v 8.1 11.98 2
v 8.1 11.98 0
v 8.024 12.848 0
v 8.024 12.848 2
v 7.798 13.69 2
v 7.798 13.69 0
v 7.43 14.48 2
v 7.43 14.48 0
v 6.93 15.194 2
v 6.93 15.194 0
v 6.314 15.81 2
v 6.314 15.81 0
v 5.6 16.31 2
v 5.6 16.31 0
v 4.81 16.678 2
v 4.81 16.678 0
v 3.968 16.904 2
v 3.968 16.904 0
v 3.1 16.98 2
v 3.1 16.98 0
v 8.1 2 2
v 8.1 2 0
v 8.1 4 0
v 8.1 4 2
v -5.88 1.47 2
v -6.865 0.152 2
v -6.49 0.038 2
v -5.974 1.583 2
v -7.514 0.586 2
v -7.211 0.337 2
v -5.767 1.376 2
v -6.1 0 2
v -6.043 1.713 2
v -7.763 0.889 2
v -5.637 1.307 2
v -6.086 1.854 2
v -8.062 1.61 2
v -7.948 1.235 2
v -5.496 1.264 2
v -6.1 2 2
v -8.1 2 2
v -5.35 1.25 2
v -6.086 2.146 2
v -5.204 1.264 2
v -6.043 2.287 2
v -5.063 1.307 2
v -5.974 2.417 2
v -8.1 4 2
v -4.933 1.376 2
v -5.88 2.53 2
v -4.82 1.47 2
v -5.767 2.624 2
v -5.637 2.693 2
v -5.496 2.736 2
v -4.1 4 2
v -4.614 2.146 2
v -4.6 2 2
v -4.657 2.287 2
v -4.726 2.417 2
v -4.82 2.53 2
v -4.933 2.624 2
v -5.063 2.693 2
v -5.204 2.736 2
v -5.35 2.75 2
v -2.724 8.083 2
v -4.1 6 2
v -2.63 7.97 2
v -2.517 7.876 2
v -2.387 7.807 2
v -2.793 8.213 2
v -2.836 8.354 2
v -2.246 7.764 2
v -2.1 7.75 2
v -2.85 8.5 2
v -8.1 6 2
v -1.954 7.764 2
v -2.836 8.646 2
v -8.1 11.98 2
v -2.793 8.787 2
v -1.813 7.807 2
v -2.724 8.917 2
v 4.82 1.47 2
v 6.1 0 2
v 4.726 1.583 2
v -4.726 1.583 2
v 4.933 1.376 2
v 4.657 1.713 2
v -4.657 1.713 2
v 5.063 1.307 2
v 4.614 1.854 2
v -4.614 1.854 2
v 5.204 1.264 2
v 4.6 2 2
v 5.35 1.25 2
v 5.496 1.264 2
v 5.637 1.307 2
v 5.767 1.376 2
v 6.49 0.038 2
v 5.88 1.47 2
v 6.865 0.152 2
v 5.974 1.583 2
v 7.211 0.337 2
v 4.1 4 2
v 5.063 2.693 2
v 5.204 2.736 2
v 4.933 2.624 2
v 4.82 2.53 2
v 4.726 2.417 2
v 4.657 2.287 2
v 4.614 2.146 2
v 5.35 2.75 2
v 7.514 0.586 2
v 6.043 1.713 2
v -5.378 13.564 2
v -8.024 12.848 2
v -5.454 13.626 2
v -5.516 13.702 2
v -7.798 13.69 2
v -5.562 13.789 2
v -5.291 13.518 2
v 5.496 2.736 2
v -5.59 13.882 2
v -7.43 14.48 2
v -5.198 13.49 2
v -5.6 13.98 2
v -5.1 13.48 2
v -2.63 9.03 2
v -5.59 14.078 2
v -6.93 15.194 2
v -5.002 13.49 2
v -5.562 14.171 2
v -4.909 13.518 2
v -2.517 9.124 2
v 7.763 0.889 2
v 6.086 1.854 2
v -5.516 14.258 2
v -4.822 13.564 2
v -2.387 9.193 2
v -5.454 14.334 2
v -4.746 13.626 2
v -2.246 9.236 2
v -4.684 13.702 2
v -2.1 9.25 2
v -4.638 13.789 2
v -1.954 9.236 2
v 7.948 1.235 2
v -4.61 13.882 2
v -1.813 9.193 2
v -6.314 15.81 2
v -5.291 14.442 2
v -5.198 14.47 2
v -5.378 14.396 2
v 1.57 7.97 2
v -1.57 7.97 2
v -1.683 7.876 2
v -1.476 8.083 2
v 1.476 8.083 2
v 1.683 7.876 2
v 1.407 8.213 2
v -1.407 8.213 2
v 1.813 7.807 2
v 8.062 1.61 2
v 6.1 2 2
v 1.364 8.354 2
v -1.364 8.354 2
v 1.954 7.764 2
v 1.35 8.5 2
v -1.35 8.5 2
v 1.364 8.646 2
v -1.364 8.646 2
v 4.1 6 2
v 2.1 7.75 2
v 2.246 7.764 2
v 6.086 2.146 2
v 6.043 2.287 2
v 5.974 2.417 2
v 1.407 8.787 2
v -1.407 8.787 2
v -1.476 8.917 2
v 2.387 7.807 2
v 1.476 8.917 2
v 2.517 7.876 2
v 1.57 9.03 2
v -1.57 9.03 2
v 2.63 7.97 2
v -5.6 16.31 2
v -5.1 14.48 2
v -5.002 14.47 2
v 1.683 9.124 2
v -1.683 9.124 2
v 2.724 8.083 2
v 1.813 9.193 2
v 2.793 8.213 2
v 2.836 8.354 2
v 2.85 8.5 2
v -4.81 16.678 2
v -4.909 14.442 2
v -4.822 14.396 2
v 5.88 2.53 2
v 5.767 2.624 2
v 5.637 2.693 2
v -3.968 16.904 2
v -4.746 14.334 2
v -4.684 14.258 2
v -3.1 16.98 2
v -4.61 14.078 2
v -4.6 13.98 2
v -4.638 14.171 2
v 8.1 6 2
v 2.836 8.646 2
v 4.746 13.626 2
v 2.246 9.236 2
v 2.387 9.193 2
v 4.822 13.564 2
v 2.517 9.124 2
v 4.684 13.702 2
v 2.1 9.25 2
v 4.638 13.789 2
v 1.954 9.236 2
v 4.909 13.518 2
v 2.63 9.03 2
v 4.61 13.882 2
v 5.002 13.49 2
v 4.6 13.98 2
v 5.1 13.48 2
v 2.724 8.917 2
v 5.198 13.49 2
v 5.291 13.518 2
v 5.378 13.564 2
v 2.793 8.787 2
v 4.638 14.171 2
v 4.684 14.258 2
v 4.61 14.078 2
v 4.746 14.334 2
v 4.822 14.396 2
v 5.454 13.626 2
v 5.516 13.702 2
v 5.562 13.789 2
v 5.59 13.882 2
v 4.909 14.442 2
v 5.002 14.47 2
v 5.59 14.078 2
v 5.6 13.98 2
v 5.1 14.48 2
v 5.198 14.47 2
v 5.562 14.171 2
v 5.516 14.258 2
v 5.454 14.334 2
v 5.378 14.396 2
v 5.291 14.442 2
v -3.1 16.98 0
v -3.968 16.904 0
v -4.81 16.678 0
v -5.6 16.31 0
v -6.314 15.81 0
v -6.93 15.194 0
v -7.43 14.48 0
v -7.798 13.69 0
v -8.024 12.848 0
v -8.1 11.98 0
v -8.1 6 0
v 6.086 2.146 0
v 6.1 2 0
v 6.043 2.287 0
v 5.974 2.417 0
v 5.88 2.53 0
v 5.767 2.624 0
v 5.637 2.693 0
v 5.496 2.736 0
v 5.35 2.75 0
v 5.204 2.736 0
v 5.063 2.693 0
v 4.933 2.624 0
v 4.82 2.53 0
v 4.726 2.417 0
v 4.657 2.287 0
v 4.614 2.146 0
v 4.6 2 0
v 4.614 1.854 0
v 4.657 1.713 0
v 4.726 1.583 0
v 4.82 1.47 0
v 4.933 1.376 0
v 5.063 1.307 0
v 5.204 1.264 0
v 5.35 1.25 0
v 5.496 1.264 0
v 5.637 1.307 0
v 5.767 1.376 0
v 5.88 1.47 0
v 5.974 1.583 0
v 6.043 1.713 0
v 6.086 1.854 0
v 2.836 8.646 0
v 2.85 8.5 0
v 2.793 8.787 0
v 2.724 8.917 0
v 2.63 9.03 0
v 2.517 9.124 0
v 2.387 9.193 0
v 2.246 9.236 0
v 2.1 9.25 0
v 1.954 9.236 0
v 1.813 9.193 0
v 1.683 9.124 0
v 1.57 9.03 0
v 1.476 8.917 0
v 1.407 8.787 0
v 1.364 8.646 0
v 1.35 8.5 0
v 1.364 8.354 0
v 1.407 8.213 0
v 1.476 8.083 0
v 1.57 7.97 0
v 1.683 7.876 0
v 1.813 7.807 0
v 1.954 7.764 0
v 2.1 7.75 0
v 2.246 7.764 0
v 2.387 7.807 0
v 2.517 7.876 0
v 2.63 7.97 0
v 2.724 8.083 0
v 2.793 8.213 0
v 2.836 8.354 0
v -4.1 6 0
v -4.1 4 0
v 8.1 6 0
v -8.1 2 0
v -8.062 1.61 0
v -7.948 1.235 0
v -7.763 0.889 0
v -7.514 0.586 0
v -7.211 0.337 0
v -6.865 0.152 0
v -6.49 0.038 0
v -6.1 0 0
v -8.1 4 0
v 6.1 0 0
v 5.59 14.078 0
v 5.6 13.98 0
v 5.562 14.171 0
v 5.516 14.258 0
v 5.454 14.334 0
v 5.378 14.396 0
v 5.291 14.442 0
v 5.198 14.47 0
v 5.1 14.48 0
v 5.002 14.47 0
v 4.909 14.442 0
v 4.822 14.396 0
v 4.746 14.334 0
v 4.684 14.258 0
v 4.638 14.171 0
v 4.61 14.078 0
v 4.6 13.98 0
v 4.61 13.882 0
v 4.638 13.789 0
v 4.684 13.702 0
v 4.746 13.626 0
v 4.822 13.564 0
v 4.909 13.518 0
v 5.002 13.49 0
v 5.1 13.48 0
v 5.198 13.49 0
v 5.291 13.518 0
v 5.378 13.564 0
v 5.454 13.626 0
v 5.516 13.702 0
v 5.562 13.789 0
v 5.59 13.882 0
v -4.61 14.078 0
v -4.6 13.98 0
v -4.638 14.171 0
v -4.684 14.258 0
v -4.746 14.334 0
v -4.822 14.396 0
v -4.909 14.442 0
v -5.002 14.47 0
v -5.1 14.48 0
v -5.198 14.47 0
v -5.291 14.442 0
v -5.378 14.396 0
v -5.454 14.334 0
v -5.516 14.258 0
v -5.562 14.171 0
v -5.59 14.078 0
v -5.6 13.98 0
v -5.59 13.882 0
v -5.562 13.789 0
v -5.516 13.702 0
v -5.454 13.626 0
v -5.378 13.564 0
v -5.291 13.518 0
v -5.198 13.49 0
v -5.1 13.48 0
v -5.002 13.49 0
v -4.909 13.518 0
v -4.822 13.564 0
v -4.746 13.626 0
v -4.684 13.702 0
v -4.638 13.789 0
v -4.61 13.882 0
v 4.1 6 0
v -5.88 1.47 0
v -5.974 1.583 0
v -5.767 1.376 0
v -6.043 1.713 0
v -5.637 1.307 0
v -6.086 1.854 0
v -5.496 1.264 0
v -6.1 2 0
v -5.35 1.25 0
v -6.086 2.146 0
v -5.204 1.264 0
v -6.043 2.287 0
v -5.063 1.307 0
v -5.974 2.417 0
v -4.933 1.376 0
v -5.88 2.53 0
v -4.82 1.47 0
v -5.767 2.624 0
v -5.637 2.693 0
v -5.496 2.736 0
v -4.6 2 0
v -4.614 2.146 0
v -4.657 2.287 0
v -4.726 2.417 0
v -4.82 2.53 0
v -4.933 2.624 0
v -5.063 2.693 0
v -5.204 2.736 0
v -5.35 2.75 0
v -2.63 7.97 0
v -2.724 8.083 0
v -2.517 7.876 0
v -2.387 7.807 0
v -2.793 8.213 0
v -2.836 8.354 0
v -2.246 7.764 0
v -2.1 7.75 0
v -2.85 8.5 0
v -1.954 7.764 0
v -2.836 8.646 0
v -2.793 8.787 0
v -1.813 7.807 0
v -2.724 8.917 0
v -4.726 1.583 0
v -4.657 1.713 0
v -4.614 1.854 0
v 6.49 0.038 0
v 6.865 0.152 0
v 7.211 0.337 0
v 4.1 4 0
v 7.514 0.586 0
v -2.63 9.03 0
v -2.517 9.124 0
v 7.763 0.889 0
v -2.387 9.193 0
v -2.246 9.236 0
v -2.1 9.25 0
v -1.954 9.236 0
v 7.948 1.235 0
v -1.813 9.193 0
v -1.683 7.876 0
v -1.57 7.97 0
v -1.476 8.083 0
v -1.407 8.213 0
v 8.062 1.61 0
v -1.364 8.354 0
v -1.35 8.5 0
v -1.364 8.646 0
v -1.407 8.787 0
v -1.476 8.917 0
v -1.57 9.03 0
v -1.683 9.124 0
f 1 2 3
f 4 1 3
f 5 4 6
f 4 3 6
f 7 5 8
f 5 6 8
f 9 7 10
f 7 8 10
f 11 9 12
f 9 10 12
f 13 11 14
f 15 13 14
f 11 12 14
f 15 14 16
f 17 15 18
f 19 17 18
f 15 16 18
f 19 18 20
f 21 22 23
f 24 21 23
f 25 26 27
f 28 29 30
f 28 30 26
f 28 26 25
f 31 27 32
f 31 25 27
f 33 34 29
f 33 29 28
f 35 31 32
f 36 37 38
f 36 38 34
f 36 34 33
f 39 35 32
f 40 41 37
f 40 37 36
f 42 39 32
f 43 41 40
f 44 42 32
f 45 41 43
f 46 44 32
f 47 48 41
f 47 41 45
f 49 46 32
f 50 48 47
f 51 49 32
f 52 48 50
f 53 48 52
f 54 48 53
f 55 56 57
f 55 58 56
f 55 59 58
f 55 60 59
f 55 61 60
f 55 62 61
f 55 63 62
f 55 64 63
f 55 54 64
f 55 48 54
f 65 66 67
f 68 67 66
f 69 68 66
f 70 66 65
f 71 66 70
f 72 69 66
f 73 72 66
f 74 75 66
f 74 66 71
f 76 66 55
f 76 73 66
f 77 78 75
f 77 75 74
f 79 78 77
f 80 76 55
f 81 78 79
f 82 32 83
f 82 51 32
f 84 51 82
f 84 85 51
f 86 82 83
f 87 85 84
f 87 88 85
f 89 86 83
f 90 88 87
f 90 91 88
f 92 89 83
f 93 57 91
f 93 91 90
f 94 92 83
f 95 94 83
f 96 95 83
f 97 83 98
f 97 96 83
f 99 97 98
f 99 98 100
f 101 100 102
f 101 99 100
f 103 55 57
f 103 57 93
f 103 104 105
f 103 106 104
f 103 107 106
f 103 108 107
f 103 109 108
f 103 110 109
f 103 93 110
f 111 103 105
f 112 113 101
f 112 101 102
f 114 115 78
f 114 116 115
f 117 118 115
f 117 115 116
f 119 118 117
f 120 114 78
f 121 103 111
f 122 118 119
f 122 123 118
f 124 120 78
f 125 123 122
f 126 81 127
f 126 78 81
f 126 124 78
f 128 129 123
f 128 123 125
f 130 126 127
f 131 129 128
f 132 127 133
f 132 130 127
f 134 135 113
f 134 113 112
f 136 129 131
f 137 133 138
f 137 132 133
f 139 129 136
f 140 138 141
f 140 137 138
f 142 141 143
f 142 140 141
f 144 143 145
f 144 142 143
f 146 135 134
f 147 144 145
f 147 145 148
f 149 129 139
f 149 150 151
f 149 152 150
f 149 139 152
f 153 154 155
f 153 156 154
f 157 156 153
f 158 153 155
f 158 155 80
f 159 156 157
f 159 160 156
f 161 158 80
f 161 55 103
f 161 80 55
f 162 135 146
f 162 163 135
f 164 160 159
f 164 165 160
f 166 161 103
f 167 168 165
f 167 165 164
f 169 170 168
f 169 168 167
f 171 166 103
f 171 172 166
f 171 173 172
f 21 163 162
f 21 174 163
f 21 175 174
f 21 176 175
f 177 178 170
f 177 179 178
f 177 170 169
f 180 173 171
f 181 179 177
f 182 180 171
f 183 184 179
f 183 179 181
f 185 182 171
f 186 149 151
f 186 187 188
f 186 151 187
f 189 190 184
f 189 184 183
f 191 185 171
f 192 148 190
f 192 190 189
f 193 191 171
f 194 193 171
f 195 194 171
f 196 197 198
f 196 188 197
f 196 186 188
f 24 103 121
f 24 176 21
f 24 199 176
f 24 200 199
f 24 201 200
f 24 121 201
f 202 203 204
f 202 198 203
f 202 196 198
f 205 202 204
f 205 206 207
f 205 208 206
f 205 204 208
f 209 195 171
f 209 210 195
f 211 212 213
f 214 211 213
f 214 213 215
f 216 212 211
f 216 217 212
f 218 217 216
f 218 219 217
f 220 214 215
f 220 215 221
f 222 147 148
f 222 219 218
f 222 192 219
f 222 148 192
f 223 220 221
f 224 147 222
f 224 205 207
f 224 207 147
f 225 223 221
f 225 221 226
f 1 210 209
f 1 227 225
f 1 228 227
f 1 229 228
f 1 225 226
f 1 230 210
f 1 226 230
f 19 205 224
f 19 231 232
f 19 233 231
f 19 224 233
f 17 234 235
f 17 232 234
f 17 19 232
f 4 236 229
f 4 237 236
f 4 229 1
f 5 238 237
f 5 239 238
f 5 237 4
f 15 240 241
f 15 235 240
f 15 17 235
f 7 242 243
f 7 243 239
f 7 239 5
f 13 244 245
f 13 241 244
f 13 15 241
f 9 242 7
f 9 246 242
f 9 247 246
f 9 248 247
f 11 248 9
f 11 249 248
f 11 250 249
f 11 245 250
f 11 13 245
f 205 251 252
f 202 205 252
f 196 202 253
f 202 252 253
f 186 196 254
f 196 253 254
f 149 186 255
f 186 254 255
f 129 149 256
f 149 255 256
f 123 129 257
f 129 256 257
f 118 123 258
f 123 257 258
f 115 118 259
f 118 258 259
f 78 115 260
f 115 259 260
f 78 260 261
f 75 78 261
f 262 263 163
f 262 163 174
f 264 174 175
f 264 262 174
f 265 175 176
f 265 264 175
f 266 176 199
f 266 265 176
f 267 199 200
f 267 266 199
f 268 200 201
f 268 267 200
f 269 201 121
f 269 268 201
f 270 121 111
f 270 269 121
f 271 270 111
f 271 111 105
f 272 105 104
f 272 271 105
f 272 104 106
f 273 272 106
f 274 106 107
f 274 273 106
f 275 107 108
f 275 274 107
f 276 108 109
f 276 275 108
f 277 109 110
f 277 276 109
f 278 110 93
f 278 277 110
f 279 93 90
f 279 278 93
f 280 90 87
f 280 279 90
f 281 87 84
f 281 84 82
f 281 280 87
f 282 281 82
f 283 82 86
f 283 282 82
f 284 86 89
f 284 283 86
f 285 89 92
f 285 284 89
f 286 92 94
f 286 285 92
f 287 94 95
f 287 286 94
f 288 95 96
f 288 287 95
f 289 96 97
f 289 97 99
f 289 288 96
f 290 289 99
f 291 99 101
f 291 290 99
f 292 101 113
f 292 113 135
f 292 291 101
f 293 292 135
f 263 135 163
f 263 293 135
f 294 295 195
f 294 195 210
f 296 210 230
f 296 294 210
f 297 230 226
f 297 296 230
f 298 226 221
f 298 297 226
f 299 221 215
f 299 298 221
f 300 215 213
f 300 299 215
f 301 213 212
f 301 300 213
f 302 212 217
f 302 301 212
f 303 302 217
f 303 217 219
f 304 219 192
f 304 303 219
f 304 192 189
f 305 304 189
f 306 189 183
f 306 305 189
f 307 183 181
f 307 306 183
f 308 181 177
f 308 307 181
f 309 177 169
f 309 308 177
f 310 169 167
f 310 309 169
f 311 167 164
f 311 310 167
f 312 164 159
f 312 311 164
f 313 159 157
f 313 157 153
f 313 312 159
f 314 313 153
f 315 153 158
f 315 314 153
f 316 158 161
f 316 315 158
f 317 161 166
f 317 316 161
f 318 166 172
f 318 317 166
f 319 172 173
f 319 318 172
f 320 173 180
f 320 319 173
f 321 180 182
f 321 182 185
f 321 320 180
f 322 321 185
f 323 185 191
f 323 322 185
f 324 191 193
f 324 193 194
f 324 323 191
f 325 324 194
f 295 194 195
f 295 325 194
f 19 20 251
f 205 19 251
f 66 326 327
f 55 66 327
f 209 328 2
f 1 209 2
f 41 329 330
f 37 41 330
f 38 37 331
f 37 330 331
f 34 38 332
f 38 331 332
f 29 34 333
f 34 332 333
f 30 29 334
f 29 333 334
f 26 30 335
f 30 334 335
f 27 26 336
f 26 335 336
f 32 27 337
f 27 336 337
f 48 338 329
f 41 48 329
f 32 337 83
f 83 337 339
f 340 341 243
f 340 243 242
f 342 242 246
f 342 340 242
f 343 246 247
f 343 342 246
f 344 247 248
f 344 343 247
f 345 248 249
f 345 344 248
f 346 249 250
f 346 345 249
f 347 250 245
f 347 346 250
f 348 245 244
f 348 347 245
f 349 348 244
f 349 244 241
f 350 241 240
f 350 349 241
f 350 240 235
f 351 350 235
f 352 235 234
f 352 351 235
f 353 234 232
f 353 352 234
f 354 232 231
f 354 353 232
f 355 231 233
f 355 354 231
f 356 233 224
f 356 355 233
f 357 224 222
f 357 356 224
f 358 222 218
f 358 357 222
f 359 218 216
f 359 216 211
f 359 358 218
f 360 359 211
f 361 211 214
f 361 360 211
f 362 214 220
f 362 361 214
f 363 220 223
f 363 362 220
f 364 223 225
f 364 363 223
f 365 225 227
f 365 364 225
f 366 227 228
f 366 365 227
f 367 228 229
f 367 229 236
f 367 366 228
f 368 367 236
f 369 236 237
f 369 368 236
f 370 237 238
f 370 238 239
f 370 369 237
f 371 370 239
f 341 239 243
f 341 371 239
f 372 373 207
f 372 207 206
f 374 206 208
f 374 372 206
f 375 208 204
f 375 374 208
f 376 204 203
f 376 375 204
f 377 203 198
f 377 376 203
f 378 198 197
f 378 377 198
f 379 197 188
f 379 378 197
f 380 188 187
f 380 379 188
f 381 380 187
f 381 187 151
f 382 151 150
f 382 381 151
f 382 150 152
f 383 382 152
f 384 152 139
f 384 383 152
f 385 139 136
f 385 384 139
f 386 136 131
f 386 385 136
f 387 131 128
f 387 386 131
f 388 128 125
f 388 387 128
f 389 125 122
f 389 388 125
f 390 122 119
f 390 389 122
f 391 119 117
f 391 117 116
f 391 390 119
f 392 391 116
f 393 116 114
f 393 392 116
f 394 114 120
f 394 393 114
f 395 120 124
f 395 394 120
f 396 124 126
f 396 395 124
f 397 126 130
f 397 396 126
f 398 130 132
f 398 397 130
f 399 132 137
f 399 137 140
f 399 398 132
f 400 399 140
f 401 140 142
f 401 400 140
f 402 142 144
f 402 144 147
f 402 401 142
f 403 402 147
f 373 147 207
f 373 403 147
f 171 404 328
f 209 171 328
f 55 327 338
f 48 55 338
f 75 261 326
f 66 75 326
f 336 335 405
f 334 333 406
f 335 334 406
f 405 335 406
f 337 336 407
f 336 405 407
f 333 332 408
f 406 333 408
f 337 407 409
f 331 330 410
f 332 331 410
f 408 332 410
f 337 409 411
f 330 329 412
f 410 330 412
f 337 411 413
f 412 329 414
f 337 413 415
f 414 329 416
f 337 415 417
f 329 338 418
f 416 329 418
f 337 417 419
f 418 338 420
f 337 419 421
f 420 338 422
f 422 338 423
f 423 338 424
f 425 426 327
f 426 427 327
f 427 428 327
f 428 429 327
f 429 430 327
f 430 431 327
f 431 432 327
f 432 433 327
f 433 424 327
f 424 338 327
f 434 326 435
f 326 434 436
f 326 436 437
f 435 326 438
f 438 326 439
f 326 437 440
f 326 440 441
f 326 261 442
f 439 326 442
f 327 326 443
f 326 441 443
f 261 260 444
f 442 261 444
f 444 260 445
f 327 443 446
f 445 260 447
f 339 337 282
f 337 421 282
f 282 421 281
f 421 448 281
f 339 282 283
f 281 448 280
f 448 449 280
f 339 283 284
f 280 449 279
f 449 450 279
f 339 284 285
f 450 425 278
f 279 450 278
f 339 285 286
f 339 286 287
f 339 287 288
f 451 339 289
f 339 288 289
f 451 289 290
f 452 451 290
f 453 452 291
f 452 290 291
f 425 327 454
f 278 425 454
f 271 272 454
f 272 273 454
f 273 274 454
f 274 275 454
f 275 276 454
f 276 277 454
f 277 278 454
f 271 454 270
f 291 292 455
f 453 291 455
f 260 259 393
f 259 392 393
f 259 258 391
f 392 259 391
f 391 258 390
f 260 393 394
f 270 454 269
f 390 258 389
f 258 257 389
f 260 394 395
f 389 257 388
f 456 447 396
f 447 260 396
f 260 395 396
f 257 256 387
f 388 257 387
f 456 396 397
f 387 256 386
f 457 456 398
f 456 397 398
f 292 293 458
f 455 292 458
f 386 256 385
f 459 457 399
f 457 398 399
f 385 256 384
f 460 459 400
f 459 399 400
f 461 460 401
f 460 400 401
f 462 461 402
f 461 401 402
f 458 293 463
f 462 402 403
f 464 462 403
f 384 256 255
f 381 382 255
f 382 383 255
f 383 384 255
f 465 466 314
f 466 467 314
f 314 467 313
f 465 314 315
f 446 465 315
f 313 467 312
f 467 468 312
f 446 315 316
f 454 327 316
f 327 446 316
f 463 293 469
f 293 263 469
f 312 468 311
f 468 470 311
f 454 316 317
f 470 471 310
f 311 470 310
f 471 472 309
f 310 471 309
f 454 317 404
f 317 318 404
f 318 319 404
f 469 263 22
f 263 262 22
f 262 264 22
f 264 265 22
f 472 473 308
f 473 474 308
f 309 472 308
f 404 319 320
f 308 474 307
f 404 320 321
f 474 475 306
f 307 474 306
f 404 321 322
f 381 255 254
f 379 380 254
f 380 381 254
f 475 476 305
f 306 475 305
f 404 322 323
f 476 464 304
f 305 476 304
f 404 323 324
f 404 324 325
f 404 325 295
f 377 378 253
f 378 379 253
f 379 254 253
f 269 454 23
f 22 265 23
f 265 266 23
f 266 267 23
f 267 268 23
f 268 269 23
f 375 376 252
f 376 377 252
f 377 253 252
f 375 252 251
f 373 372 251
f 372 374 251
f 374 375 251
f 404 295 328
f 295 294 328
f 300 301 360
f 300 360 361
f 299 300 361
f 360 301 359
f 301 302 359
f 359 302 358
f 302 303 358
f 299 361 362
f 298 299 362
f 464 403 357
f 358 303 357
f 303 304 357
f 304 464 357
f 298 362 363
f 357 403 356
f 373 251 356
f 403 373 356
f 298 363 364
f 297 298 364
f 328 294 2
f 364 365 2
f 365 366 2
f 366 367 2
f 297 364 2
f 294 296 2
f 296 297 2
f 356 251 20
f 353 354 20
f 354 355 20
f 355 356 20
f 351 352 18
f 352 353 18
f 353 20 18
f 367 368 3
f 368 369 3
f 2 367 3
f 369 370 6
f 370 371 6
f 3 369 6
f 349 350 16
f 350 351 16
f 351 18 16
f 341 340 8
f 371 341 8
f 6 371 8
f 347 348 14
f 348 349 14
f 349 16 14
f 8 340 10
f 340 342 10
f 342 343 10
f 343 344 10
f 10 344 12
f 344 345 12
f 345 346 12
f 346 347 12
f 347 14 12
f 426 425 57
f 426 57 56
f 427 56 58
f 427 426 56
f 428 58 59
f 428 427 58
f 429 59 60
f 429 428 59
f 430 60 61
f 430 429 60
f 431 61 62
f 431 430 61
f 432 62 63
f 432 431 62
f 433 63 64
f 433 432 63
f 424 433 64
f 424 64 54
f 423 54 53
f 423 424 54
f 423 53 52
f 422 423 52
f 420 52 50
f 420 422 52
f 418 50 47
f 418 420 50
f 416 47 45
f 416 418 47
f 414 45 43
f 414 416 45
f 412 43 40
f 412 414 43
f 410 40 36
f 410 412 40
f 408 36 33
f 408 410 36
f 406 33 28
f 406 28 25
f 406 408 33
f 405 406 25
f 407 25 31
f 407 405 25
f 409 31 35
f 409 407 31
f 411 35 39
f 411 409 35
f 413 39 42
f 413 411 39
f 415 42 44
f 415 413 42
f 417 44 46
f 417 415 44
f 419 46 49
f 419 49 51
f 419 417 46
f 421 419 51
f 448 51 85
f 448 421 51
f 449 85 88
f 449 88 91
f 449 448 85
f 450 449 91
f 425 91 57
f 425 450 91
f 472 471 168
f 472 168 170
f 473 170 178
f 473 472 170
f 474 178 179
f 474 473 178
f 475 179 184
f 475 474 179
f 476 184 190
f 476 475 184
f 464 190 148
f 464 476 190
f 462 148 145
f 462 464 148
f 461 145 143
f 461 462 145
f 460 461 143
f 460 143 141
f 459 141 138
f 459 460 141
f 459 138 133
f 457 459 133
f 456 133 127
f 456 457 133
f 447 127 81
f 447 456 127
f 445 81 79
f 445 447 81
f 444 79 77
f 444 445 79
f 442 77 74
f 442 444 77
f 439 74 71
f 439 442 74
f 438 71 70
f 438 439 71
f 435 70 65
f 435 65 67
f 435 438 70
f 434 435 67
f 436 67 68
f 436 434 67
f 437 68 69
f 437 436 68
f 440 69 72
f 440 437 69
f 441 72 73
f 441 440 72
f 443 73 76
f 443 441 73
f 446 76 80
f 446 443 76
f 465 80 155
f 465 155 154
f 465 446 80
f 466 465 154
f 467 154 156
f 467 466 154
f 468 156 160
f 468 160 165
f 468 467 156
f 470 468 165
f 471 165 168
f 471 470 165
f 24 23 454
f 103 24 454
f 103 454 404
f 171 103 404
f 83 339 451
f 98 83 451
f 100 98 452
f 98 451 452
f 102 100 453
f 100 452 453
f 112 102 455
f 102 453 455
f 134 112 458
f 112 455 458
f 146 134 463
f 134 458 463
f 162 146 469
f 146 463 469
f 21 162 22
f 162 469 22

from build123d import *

# Parameters (mm, degrees)
SKETCH1_R           = 0.75
SKETCH1_R_2         = 0.5
BOSS_EXTRUDE1_DEPTH = 2


with BuildPart() as part:
    # Sketch1 → Boss-Extrude1 (new body)
    with BuildSketch(Plane.XY):
        with BuildLine():
            Line((3.1, 16.98), (-3.1, 16.98))
            ThreePointArc((-3.1, 16.98), (-6.635533906, 15.515533906), (-8.1, 11.98))
            Line((-8.1, 11.98), (-8.1, 6))
            Line((-8.1, 6), (-4.1, 6))
            Line((-4.1, 6), (-4.1, 4))
            Line((-4.1, 4), (-8.1, 4))
            Line((-8.1, 4), (-8.1, 2))
            ThreePointArc((-8.1, 2), (-7.514213562, 0.585786438), (-6.1, 0))
            Line((-6.1, 0), (6.1, 0))
            ThreePointArc((6.1, 0), (7.514213562, 0.585786438), (8.1, 2))
            Line((8.1, 2), (8.1, 4))
            Line((8.1, 4), (4.1, 4))
            Line((4.1, 4), (4.1, 6))
            Line((4.1, 6), (8.1, 6))
            Line((8.1, 6), (8.1, 11.98))
            ThreePointArc((8.1, 11.98), (6.635533906, 15.515533906), (3.1, 16.98))
        make_face()
        with Locations((-5.35, 2)):
            Circle(SKETCH1_R, mode=Mode.SUBTRACT)
        with Locations((-5.1, 13.98)):
            Circle(SKETCH1_R_2, mode=Mode.SUBTRACT)
        with Locations((-2.1, 8.5)):
            Circle(SKETCH1_R, mode=Mode.SUBTRACT)
        with Locations((2.1, 8.5)):
            Circle(SKETCH1_R, mode=Mode.SUBTRACT)
        with Locations((5.1, 13.98)):
            Circle(SKETCH1_R_2, mode=Mode.SUBTRACT)
        with Locations((5.35, 2)):
            Circle(SKETCH1_R, mode=Mode.SUBTRACT)
    extrude(amount=BOSS_EXTRUDE1_DEPTH)


solid = part.part
